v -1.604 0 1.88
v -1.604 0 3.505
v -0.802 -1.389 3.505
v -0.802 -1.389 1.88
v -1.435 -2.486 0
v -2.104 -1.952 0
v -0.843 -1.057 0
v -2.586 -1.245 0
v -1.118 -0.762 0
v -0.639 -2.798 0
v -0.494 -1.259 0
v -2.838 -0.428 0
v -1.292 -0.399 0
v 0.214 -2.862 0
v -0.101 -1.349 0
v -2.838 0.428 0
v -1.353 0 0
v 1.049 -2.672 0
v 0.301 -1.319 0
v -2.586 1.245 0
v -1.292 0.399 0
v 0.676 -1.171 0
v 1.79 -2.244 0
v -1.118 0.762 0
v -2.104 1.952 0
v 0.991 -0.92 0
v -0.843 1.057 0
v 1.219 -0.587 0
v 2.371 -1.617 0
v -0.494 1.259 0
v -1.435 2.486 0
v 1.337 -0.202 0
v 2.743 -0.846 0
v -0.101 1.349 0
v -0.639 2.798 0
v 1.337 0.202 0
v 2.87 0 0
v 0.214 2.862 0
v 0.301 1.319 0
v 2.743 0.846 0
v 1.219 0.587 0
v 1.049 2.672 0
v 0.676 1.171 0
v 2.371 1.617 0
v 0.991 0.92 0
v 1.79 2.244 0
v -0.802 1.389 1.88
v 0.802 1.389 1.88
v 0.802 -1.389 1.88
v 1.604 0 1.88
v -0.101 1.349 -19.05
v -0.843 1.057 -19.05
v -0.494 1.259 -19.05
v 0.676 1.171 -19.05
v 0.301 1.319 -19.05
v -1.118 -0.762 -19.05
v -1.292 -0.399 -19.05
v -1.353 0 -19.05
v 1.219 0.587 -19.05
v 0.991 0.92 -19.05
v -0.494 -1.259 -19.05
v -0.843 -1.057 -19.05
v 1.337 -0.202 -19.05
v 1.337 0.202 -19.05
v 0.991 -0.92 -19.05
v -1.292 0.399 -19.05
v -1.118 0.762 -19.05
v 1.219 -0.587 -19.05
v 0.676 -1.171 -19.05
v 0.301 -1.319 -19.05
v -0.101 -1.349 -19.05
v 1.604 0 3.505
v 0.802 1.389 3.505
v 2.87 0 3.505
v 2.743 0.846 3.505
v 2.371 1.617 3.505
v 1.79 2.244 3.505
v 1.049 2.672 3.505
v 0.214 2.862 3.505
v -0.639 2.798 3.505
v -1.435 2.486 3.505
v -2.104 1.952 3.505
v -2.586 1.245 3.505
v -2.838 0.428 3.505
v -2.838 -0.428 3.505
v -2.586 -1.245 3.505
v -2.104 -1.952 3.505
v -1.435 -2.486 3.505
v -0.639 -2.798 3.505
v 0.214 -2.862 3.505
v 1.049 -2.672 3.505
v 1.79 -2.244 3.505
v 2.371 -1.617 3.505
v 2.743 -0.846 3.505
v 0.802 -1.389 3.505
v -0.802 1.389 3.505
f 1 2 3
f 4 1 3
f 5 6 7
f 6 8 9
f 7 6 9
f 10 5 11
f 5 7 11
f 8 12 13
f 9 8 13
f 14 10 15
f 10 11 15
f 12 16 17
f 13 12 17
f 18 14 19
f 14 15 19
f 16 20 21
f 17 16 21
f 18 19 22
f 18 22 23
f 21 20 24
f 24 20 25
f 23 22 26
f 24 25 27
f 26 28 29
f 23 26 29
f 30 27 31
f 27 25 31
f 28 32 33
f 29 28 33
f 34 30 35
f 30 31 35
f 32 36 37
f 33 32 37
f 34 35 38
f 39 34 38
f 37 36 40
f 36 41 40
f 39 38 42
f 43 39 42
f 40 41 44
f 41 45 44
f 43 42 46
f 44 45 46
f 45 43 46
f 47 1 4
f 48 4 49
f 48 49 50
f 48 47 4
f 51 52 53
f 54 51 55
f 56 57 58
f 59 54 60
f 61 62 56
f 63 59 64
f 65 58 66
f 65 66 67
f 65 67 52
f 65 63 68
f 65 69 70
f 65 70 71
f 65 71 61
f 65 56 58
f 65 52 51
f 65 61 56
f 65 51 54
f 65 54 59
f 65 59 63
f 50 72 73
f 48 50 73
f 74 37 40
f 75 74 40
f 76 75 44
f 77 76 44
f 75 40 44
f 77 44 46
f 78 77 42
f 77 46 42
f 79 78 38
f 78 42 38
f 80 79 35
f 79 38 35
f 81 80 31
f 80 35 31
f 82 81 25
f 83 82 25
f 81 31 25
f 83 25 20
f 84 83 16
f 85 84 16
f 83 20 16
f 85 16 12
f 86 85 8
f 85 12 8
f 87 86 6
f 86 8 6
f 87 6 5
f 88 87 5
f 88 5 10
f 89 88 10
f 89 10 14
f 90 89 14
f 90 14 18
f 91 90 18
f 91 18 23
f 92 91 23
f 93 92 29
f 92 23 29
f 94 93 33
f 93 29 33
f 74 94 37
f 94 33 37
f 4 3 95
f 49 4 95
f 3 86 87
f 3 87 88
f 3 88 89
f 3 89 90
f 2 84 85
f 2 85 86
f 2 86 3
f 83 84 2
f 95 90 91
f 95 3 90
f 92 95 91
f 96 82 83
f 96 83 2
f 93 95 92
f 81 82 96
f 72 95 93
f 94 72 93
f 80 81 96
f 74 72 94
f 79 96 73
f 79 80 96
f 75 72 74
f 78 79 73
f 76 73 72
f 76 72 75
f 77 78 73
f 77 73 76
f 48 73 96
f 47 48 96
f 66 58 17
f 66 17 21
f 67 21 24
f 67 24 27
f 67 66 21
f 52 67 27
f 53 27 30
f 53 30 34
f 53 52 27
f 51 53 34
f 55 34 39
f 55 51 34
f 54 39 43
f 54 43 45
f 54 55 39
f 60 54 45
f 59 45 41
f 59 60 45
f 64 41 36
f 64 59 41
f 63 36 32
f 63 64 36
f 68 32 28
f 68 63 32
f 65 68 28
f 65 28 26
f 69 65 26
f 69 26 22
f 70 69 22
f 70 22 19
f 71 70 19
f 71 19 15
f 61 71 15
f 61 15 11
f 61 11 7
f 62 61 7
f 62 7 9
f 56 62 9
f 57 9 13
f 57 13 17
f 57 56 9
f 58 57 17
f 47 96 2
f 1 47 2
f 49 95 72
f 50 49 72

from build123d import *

# Parameters (mm, degrees)
SKETCH1_R           = 2.8702
BOSS_EXTRUDE1_DEPTH = 3.5052
SKETCH2_R           = 1.7526
BOSS_EXTRUDE2_DEPTH = 19.05
SKETCH3_OUTSIDE_W   = 12.534
SKETCH3_OUTSIDE_H   = 12.534
SKETCH3_OUTSIDE_R   = 1.35255
CUT_EXTRUDE1_DEPTH  = 19.05
CUT_EXTRUDE2_DEPTH  = 1.6256


with BuildPart() as part:
    # Sketch1 → Boss-Extrude1 (new body)
    with BuildSketch(Plane.XY):
        Circle(SKETCH1_R)
    extrude(amount=BOSS_EXTRUDE1_DEPTH)

    # Sketch2 → Boss-Extrude2 (add)
    with BuildSketch(Plane(origin=(0, 0, 0), x_dir=(-1, 0, 0), z_dir=(0, 0, -1))):
        Circle(SKETCH2_R)
    extrude(amount=BOSS_EXTRUDE2_DEPTH)

    # Sketch3 outside → Cut-Extrude1 (cut)
    with BuildSketch(Plane(origin=(0, 0, -19.05), x_dir=(-1, 0, 0), z_dir=(0, 0, -1))):
        Rectangle(SKETCH3_OUTSIDE_W, SKETCH3_OUTSIDE_H)
        Circle(SKETCH3_OUTSIDE_R, mode=Mode.SUBTRACT)
    extrude(amount=-CUT_EXTRUDE1_DEPTH, mode=Mode.SUBTRACT)

    # Sketch4 → Cut-Extrude2 (cut)
    with BuildSketch(Plane.XY.offset(3.5052)):
        Polygon((0.801975608, 1.3890625), (-0.801975608, 1.3890625), (-1.603951217, 0), (-0.801975608, -1.3890625), (0.801975608, -1.3890625), (1.603951217, 0), align=None)
    extrude(amount=-CUT_EXTRUDE2_DEPTH, mode=Mode.SUBTRACT)


solid = part.part
